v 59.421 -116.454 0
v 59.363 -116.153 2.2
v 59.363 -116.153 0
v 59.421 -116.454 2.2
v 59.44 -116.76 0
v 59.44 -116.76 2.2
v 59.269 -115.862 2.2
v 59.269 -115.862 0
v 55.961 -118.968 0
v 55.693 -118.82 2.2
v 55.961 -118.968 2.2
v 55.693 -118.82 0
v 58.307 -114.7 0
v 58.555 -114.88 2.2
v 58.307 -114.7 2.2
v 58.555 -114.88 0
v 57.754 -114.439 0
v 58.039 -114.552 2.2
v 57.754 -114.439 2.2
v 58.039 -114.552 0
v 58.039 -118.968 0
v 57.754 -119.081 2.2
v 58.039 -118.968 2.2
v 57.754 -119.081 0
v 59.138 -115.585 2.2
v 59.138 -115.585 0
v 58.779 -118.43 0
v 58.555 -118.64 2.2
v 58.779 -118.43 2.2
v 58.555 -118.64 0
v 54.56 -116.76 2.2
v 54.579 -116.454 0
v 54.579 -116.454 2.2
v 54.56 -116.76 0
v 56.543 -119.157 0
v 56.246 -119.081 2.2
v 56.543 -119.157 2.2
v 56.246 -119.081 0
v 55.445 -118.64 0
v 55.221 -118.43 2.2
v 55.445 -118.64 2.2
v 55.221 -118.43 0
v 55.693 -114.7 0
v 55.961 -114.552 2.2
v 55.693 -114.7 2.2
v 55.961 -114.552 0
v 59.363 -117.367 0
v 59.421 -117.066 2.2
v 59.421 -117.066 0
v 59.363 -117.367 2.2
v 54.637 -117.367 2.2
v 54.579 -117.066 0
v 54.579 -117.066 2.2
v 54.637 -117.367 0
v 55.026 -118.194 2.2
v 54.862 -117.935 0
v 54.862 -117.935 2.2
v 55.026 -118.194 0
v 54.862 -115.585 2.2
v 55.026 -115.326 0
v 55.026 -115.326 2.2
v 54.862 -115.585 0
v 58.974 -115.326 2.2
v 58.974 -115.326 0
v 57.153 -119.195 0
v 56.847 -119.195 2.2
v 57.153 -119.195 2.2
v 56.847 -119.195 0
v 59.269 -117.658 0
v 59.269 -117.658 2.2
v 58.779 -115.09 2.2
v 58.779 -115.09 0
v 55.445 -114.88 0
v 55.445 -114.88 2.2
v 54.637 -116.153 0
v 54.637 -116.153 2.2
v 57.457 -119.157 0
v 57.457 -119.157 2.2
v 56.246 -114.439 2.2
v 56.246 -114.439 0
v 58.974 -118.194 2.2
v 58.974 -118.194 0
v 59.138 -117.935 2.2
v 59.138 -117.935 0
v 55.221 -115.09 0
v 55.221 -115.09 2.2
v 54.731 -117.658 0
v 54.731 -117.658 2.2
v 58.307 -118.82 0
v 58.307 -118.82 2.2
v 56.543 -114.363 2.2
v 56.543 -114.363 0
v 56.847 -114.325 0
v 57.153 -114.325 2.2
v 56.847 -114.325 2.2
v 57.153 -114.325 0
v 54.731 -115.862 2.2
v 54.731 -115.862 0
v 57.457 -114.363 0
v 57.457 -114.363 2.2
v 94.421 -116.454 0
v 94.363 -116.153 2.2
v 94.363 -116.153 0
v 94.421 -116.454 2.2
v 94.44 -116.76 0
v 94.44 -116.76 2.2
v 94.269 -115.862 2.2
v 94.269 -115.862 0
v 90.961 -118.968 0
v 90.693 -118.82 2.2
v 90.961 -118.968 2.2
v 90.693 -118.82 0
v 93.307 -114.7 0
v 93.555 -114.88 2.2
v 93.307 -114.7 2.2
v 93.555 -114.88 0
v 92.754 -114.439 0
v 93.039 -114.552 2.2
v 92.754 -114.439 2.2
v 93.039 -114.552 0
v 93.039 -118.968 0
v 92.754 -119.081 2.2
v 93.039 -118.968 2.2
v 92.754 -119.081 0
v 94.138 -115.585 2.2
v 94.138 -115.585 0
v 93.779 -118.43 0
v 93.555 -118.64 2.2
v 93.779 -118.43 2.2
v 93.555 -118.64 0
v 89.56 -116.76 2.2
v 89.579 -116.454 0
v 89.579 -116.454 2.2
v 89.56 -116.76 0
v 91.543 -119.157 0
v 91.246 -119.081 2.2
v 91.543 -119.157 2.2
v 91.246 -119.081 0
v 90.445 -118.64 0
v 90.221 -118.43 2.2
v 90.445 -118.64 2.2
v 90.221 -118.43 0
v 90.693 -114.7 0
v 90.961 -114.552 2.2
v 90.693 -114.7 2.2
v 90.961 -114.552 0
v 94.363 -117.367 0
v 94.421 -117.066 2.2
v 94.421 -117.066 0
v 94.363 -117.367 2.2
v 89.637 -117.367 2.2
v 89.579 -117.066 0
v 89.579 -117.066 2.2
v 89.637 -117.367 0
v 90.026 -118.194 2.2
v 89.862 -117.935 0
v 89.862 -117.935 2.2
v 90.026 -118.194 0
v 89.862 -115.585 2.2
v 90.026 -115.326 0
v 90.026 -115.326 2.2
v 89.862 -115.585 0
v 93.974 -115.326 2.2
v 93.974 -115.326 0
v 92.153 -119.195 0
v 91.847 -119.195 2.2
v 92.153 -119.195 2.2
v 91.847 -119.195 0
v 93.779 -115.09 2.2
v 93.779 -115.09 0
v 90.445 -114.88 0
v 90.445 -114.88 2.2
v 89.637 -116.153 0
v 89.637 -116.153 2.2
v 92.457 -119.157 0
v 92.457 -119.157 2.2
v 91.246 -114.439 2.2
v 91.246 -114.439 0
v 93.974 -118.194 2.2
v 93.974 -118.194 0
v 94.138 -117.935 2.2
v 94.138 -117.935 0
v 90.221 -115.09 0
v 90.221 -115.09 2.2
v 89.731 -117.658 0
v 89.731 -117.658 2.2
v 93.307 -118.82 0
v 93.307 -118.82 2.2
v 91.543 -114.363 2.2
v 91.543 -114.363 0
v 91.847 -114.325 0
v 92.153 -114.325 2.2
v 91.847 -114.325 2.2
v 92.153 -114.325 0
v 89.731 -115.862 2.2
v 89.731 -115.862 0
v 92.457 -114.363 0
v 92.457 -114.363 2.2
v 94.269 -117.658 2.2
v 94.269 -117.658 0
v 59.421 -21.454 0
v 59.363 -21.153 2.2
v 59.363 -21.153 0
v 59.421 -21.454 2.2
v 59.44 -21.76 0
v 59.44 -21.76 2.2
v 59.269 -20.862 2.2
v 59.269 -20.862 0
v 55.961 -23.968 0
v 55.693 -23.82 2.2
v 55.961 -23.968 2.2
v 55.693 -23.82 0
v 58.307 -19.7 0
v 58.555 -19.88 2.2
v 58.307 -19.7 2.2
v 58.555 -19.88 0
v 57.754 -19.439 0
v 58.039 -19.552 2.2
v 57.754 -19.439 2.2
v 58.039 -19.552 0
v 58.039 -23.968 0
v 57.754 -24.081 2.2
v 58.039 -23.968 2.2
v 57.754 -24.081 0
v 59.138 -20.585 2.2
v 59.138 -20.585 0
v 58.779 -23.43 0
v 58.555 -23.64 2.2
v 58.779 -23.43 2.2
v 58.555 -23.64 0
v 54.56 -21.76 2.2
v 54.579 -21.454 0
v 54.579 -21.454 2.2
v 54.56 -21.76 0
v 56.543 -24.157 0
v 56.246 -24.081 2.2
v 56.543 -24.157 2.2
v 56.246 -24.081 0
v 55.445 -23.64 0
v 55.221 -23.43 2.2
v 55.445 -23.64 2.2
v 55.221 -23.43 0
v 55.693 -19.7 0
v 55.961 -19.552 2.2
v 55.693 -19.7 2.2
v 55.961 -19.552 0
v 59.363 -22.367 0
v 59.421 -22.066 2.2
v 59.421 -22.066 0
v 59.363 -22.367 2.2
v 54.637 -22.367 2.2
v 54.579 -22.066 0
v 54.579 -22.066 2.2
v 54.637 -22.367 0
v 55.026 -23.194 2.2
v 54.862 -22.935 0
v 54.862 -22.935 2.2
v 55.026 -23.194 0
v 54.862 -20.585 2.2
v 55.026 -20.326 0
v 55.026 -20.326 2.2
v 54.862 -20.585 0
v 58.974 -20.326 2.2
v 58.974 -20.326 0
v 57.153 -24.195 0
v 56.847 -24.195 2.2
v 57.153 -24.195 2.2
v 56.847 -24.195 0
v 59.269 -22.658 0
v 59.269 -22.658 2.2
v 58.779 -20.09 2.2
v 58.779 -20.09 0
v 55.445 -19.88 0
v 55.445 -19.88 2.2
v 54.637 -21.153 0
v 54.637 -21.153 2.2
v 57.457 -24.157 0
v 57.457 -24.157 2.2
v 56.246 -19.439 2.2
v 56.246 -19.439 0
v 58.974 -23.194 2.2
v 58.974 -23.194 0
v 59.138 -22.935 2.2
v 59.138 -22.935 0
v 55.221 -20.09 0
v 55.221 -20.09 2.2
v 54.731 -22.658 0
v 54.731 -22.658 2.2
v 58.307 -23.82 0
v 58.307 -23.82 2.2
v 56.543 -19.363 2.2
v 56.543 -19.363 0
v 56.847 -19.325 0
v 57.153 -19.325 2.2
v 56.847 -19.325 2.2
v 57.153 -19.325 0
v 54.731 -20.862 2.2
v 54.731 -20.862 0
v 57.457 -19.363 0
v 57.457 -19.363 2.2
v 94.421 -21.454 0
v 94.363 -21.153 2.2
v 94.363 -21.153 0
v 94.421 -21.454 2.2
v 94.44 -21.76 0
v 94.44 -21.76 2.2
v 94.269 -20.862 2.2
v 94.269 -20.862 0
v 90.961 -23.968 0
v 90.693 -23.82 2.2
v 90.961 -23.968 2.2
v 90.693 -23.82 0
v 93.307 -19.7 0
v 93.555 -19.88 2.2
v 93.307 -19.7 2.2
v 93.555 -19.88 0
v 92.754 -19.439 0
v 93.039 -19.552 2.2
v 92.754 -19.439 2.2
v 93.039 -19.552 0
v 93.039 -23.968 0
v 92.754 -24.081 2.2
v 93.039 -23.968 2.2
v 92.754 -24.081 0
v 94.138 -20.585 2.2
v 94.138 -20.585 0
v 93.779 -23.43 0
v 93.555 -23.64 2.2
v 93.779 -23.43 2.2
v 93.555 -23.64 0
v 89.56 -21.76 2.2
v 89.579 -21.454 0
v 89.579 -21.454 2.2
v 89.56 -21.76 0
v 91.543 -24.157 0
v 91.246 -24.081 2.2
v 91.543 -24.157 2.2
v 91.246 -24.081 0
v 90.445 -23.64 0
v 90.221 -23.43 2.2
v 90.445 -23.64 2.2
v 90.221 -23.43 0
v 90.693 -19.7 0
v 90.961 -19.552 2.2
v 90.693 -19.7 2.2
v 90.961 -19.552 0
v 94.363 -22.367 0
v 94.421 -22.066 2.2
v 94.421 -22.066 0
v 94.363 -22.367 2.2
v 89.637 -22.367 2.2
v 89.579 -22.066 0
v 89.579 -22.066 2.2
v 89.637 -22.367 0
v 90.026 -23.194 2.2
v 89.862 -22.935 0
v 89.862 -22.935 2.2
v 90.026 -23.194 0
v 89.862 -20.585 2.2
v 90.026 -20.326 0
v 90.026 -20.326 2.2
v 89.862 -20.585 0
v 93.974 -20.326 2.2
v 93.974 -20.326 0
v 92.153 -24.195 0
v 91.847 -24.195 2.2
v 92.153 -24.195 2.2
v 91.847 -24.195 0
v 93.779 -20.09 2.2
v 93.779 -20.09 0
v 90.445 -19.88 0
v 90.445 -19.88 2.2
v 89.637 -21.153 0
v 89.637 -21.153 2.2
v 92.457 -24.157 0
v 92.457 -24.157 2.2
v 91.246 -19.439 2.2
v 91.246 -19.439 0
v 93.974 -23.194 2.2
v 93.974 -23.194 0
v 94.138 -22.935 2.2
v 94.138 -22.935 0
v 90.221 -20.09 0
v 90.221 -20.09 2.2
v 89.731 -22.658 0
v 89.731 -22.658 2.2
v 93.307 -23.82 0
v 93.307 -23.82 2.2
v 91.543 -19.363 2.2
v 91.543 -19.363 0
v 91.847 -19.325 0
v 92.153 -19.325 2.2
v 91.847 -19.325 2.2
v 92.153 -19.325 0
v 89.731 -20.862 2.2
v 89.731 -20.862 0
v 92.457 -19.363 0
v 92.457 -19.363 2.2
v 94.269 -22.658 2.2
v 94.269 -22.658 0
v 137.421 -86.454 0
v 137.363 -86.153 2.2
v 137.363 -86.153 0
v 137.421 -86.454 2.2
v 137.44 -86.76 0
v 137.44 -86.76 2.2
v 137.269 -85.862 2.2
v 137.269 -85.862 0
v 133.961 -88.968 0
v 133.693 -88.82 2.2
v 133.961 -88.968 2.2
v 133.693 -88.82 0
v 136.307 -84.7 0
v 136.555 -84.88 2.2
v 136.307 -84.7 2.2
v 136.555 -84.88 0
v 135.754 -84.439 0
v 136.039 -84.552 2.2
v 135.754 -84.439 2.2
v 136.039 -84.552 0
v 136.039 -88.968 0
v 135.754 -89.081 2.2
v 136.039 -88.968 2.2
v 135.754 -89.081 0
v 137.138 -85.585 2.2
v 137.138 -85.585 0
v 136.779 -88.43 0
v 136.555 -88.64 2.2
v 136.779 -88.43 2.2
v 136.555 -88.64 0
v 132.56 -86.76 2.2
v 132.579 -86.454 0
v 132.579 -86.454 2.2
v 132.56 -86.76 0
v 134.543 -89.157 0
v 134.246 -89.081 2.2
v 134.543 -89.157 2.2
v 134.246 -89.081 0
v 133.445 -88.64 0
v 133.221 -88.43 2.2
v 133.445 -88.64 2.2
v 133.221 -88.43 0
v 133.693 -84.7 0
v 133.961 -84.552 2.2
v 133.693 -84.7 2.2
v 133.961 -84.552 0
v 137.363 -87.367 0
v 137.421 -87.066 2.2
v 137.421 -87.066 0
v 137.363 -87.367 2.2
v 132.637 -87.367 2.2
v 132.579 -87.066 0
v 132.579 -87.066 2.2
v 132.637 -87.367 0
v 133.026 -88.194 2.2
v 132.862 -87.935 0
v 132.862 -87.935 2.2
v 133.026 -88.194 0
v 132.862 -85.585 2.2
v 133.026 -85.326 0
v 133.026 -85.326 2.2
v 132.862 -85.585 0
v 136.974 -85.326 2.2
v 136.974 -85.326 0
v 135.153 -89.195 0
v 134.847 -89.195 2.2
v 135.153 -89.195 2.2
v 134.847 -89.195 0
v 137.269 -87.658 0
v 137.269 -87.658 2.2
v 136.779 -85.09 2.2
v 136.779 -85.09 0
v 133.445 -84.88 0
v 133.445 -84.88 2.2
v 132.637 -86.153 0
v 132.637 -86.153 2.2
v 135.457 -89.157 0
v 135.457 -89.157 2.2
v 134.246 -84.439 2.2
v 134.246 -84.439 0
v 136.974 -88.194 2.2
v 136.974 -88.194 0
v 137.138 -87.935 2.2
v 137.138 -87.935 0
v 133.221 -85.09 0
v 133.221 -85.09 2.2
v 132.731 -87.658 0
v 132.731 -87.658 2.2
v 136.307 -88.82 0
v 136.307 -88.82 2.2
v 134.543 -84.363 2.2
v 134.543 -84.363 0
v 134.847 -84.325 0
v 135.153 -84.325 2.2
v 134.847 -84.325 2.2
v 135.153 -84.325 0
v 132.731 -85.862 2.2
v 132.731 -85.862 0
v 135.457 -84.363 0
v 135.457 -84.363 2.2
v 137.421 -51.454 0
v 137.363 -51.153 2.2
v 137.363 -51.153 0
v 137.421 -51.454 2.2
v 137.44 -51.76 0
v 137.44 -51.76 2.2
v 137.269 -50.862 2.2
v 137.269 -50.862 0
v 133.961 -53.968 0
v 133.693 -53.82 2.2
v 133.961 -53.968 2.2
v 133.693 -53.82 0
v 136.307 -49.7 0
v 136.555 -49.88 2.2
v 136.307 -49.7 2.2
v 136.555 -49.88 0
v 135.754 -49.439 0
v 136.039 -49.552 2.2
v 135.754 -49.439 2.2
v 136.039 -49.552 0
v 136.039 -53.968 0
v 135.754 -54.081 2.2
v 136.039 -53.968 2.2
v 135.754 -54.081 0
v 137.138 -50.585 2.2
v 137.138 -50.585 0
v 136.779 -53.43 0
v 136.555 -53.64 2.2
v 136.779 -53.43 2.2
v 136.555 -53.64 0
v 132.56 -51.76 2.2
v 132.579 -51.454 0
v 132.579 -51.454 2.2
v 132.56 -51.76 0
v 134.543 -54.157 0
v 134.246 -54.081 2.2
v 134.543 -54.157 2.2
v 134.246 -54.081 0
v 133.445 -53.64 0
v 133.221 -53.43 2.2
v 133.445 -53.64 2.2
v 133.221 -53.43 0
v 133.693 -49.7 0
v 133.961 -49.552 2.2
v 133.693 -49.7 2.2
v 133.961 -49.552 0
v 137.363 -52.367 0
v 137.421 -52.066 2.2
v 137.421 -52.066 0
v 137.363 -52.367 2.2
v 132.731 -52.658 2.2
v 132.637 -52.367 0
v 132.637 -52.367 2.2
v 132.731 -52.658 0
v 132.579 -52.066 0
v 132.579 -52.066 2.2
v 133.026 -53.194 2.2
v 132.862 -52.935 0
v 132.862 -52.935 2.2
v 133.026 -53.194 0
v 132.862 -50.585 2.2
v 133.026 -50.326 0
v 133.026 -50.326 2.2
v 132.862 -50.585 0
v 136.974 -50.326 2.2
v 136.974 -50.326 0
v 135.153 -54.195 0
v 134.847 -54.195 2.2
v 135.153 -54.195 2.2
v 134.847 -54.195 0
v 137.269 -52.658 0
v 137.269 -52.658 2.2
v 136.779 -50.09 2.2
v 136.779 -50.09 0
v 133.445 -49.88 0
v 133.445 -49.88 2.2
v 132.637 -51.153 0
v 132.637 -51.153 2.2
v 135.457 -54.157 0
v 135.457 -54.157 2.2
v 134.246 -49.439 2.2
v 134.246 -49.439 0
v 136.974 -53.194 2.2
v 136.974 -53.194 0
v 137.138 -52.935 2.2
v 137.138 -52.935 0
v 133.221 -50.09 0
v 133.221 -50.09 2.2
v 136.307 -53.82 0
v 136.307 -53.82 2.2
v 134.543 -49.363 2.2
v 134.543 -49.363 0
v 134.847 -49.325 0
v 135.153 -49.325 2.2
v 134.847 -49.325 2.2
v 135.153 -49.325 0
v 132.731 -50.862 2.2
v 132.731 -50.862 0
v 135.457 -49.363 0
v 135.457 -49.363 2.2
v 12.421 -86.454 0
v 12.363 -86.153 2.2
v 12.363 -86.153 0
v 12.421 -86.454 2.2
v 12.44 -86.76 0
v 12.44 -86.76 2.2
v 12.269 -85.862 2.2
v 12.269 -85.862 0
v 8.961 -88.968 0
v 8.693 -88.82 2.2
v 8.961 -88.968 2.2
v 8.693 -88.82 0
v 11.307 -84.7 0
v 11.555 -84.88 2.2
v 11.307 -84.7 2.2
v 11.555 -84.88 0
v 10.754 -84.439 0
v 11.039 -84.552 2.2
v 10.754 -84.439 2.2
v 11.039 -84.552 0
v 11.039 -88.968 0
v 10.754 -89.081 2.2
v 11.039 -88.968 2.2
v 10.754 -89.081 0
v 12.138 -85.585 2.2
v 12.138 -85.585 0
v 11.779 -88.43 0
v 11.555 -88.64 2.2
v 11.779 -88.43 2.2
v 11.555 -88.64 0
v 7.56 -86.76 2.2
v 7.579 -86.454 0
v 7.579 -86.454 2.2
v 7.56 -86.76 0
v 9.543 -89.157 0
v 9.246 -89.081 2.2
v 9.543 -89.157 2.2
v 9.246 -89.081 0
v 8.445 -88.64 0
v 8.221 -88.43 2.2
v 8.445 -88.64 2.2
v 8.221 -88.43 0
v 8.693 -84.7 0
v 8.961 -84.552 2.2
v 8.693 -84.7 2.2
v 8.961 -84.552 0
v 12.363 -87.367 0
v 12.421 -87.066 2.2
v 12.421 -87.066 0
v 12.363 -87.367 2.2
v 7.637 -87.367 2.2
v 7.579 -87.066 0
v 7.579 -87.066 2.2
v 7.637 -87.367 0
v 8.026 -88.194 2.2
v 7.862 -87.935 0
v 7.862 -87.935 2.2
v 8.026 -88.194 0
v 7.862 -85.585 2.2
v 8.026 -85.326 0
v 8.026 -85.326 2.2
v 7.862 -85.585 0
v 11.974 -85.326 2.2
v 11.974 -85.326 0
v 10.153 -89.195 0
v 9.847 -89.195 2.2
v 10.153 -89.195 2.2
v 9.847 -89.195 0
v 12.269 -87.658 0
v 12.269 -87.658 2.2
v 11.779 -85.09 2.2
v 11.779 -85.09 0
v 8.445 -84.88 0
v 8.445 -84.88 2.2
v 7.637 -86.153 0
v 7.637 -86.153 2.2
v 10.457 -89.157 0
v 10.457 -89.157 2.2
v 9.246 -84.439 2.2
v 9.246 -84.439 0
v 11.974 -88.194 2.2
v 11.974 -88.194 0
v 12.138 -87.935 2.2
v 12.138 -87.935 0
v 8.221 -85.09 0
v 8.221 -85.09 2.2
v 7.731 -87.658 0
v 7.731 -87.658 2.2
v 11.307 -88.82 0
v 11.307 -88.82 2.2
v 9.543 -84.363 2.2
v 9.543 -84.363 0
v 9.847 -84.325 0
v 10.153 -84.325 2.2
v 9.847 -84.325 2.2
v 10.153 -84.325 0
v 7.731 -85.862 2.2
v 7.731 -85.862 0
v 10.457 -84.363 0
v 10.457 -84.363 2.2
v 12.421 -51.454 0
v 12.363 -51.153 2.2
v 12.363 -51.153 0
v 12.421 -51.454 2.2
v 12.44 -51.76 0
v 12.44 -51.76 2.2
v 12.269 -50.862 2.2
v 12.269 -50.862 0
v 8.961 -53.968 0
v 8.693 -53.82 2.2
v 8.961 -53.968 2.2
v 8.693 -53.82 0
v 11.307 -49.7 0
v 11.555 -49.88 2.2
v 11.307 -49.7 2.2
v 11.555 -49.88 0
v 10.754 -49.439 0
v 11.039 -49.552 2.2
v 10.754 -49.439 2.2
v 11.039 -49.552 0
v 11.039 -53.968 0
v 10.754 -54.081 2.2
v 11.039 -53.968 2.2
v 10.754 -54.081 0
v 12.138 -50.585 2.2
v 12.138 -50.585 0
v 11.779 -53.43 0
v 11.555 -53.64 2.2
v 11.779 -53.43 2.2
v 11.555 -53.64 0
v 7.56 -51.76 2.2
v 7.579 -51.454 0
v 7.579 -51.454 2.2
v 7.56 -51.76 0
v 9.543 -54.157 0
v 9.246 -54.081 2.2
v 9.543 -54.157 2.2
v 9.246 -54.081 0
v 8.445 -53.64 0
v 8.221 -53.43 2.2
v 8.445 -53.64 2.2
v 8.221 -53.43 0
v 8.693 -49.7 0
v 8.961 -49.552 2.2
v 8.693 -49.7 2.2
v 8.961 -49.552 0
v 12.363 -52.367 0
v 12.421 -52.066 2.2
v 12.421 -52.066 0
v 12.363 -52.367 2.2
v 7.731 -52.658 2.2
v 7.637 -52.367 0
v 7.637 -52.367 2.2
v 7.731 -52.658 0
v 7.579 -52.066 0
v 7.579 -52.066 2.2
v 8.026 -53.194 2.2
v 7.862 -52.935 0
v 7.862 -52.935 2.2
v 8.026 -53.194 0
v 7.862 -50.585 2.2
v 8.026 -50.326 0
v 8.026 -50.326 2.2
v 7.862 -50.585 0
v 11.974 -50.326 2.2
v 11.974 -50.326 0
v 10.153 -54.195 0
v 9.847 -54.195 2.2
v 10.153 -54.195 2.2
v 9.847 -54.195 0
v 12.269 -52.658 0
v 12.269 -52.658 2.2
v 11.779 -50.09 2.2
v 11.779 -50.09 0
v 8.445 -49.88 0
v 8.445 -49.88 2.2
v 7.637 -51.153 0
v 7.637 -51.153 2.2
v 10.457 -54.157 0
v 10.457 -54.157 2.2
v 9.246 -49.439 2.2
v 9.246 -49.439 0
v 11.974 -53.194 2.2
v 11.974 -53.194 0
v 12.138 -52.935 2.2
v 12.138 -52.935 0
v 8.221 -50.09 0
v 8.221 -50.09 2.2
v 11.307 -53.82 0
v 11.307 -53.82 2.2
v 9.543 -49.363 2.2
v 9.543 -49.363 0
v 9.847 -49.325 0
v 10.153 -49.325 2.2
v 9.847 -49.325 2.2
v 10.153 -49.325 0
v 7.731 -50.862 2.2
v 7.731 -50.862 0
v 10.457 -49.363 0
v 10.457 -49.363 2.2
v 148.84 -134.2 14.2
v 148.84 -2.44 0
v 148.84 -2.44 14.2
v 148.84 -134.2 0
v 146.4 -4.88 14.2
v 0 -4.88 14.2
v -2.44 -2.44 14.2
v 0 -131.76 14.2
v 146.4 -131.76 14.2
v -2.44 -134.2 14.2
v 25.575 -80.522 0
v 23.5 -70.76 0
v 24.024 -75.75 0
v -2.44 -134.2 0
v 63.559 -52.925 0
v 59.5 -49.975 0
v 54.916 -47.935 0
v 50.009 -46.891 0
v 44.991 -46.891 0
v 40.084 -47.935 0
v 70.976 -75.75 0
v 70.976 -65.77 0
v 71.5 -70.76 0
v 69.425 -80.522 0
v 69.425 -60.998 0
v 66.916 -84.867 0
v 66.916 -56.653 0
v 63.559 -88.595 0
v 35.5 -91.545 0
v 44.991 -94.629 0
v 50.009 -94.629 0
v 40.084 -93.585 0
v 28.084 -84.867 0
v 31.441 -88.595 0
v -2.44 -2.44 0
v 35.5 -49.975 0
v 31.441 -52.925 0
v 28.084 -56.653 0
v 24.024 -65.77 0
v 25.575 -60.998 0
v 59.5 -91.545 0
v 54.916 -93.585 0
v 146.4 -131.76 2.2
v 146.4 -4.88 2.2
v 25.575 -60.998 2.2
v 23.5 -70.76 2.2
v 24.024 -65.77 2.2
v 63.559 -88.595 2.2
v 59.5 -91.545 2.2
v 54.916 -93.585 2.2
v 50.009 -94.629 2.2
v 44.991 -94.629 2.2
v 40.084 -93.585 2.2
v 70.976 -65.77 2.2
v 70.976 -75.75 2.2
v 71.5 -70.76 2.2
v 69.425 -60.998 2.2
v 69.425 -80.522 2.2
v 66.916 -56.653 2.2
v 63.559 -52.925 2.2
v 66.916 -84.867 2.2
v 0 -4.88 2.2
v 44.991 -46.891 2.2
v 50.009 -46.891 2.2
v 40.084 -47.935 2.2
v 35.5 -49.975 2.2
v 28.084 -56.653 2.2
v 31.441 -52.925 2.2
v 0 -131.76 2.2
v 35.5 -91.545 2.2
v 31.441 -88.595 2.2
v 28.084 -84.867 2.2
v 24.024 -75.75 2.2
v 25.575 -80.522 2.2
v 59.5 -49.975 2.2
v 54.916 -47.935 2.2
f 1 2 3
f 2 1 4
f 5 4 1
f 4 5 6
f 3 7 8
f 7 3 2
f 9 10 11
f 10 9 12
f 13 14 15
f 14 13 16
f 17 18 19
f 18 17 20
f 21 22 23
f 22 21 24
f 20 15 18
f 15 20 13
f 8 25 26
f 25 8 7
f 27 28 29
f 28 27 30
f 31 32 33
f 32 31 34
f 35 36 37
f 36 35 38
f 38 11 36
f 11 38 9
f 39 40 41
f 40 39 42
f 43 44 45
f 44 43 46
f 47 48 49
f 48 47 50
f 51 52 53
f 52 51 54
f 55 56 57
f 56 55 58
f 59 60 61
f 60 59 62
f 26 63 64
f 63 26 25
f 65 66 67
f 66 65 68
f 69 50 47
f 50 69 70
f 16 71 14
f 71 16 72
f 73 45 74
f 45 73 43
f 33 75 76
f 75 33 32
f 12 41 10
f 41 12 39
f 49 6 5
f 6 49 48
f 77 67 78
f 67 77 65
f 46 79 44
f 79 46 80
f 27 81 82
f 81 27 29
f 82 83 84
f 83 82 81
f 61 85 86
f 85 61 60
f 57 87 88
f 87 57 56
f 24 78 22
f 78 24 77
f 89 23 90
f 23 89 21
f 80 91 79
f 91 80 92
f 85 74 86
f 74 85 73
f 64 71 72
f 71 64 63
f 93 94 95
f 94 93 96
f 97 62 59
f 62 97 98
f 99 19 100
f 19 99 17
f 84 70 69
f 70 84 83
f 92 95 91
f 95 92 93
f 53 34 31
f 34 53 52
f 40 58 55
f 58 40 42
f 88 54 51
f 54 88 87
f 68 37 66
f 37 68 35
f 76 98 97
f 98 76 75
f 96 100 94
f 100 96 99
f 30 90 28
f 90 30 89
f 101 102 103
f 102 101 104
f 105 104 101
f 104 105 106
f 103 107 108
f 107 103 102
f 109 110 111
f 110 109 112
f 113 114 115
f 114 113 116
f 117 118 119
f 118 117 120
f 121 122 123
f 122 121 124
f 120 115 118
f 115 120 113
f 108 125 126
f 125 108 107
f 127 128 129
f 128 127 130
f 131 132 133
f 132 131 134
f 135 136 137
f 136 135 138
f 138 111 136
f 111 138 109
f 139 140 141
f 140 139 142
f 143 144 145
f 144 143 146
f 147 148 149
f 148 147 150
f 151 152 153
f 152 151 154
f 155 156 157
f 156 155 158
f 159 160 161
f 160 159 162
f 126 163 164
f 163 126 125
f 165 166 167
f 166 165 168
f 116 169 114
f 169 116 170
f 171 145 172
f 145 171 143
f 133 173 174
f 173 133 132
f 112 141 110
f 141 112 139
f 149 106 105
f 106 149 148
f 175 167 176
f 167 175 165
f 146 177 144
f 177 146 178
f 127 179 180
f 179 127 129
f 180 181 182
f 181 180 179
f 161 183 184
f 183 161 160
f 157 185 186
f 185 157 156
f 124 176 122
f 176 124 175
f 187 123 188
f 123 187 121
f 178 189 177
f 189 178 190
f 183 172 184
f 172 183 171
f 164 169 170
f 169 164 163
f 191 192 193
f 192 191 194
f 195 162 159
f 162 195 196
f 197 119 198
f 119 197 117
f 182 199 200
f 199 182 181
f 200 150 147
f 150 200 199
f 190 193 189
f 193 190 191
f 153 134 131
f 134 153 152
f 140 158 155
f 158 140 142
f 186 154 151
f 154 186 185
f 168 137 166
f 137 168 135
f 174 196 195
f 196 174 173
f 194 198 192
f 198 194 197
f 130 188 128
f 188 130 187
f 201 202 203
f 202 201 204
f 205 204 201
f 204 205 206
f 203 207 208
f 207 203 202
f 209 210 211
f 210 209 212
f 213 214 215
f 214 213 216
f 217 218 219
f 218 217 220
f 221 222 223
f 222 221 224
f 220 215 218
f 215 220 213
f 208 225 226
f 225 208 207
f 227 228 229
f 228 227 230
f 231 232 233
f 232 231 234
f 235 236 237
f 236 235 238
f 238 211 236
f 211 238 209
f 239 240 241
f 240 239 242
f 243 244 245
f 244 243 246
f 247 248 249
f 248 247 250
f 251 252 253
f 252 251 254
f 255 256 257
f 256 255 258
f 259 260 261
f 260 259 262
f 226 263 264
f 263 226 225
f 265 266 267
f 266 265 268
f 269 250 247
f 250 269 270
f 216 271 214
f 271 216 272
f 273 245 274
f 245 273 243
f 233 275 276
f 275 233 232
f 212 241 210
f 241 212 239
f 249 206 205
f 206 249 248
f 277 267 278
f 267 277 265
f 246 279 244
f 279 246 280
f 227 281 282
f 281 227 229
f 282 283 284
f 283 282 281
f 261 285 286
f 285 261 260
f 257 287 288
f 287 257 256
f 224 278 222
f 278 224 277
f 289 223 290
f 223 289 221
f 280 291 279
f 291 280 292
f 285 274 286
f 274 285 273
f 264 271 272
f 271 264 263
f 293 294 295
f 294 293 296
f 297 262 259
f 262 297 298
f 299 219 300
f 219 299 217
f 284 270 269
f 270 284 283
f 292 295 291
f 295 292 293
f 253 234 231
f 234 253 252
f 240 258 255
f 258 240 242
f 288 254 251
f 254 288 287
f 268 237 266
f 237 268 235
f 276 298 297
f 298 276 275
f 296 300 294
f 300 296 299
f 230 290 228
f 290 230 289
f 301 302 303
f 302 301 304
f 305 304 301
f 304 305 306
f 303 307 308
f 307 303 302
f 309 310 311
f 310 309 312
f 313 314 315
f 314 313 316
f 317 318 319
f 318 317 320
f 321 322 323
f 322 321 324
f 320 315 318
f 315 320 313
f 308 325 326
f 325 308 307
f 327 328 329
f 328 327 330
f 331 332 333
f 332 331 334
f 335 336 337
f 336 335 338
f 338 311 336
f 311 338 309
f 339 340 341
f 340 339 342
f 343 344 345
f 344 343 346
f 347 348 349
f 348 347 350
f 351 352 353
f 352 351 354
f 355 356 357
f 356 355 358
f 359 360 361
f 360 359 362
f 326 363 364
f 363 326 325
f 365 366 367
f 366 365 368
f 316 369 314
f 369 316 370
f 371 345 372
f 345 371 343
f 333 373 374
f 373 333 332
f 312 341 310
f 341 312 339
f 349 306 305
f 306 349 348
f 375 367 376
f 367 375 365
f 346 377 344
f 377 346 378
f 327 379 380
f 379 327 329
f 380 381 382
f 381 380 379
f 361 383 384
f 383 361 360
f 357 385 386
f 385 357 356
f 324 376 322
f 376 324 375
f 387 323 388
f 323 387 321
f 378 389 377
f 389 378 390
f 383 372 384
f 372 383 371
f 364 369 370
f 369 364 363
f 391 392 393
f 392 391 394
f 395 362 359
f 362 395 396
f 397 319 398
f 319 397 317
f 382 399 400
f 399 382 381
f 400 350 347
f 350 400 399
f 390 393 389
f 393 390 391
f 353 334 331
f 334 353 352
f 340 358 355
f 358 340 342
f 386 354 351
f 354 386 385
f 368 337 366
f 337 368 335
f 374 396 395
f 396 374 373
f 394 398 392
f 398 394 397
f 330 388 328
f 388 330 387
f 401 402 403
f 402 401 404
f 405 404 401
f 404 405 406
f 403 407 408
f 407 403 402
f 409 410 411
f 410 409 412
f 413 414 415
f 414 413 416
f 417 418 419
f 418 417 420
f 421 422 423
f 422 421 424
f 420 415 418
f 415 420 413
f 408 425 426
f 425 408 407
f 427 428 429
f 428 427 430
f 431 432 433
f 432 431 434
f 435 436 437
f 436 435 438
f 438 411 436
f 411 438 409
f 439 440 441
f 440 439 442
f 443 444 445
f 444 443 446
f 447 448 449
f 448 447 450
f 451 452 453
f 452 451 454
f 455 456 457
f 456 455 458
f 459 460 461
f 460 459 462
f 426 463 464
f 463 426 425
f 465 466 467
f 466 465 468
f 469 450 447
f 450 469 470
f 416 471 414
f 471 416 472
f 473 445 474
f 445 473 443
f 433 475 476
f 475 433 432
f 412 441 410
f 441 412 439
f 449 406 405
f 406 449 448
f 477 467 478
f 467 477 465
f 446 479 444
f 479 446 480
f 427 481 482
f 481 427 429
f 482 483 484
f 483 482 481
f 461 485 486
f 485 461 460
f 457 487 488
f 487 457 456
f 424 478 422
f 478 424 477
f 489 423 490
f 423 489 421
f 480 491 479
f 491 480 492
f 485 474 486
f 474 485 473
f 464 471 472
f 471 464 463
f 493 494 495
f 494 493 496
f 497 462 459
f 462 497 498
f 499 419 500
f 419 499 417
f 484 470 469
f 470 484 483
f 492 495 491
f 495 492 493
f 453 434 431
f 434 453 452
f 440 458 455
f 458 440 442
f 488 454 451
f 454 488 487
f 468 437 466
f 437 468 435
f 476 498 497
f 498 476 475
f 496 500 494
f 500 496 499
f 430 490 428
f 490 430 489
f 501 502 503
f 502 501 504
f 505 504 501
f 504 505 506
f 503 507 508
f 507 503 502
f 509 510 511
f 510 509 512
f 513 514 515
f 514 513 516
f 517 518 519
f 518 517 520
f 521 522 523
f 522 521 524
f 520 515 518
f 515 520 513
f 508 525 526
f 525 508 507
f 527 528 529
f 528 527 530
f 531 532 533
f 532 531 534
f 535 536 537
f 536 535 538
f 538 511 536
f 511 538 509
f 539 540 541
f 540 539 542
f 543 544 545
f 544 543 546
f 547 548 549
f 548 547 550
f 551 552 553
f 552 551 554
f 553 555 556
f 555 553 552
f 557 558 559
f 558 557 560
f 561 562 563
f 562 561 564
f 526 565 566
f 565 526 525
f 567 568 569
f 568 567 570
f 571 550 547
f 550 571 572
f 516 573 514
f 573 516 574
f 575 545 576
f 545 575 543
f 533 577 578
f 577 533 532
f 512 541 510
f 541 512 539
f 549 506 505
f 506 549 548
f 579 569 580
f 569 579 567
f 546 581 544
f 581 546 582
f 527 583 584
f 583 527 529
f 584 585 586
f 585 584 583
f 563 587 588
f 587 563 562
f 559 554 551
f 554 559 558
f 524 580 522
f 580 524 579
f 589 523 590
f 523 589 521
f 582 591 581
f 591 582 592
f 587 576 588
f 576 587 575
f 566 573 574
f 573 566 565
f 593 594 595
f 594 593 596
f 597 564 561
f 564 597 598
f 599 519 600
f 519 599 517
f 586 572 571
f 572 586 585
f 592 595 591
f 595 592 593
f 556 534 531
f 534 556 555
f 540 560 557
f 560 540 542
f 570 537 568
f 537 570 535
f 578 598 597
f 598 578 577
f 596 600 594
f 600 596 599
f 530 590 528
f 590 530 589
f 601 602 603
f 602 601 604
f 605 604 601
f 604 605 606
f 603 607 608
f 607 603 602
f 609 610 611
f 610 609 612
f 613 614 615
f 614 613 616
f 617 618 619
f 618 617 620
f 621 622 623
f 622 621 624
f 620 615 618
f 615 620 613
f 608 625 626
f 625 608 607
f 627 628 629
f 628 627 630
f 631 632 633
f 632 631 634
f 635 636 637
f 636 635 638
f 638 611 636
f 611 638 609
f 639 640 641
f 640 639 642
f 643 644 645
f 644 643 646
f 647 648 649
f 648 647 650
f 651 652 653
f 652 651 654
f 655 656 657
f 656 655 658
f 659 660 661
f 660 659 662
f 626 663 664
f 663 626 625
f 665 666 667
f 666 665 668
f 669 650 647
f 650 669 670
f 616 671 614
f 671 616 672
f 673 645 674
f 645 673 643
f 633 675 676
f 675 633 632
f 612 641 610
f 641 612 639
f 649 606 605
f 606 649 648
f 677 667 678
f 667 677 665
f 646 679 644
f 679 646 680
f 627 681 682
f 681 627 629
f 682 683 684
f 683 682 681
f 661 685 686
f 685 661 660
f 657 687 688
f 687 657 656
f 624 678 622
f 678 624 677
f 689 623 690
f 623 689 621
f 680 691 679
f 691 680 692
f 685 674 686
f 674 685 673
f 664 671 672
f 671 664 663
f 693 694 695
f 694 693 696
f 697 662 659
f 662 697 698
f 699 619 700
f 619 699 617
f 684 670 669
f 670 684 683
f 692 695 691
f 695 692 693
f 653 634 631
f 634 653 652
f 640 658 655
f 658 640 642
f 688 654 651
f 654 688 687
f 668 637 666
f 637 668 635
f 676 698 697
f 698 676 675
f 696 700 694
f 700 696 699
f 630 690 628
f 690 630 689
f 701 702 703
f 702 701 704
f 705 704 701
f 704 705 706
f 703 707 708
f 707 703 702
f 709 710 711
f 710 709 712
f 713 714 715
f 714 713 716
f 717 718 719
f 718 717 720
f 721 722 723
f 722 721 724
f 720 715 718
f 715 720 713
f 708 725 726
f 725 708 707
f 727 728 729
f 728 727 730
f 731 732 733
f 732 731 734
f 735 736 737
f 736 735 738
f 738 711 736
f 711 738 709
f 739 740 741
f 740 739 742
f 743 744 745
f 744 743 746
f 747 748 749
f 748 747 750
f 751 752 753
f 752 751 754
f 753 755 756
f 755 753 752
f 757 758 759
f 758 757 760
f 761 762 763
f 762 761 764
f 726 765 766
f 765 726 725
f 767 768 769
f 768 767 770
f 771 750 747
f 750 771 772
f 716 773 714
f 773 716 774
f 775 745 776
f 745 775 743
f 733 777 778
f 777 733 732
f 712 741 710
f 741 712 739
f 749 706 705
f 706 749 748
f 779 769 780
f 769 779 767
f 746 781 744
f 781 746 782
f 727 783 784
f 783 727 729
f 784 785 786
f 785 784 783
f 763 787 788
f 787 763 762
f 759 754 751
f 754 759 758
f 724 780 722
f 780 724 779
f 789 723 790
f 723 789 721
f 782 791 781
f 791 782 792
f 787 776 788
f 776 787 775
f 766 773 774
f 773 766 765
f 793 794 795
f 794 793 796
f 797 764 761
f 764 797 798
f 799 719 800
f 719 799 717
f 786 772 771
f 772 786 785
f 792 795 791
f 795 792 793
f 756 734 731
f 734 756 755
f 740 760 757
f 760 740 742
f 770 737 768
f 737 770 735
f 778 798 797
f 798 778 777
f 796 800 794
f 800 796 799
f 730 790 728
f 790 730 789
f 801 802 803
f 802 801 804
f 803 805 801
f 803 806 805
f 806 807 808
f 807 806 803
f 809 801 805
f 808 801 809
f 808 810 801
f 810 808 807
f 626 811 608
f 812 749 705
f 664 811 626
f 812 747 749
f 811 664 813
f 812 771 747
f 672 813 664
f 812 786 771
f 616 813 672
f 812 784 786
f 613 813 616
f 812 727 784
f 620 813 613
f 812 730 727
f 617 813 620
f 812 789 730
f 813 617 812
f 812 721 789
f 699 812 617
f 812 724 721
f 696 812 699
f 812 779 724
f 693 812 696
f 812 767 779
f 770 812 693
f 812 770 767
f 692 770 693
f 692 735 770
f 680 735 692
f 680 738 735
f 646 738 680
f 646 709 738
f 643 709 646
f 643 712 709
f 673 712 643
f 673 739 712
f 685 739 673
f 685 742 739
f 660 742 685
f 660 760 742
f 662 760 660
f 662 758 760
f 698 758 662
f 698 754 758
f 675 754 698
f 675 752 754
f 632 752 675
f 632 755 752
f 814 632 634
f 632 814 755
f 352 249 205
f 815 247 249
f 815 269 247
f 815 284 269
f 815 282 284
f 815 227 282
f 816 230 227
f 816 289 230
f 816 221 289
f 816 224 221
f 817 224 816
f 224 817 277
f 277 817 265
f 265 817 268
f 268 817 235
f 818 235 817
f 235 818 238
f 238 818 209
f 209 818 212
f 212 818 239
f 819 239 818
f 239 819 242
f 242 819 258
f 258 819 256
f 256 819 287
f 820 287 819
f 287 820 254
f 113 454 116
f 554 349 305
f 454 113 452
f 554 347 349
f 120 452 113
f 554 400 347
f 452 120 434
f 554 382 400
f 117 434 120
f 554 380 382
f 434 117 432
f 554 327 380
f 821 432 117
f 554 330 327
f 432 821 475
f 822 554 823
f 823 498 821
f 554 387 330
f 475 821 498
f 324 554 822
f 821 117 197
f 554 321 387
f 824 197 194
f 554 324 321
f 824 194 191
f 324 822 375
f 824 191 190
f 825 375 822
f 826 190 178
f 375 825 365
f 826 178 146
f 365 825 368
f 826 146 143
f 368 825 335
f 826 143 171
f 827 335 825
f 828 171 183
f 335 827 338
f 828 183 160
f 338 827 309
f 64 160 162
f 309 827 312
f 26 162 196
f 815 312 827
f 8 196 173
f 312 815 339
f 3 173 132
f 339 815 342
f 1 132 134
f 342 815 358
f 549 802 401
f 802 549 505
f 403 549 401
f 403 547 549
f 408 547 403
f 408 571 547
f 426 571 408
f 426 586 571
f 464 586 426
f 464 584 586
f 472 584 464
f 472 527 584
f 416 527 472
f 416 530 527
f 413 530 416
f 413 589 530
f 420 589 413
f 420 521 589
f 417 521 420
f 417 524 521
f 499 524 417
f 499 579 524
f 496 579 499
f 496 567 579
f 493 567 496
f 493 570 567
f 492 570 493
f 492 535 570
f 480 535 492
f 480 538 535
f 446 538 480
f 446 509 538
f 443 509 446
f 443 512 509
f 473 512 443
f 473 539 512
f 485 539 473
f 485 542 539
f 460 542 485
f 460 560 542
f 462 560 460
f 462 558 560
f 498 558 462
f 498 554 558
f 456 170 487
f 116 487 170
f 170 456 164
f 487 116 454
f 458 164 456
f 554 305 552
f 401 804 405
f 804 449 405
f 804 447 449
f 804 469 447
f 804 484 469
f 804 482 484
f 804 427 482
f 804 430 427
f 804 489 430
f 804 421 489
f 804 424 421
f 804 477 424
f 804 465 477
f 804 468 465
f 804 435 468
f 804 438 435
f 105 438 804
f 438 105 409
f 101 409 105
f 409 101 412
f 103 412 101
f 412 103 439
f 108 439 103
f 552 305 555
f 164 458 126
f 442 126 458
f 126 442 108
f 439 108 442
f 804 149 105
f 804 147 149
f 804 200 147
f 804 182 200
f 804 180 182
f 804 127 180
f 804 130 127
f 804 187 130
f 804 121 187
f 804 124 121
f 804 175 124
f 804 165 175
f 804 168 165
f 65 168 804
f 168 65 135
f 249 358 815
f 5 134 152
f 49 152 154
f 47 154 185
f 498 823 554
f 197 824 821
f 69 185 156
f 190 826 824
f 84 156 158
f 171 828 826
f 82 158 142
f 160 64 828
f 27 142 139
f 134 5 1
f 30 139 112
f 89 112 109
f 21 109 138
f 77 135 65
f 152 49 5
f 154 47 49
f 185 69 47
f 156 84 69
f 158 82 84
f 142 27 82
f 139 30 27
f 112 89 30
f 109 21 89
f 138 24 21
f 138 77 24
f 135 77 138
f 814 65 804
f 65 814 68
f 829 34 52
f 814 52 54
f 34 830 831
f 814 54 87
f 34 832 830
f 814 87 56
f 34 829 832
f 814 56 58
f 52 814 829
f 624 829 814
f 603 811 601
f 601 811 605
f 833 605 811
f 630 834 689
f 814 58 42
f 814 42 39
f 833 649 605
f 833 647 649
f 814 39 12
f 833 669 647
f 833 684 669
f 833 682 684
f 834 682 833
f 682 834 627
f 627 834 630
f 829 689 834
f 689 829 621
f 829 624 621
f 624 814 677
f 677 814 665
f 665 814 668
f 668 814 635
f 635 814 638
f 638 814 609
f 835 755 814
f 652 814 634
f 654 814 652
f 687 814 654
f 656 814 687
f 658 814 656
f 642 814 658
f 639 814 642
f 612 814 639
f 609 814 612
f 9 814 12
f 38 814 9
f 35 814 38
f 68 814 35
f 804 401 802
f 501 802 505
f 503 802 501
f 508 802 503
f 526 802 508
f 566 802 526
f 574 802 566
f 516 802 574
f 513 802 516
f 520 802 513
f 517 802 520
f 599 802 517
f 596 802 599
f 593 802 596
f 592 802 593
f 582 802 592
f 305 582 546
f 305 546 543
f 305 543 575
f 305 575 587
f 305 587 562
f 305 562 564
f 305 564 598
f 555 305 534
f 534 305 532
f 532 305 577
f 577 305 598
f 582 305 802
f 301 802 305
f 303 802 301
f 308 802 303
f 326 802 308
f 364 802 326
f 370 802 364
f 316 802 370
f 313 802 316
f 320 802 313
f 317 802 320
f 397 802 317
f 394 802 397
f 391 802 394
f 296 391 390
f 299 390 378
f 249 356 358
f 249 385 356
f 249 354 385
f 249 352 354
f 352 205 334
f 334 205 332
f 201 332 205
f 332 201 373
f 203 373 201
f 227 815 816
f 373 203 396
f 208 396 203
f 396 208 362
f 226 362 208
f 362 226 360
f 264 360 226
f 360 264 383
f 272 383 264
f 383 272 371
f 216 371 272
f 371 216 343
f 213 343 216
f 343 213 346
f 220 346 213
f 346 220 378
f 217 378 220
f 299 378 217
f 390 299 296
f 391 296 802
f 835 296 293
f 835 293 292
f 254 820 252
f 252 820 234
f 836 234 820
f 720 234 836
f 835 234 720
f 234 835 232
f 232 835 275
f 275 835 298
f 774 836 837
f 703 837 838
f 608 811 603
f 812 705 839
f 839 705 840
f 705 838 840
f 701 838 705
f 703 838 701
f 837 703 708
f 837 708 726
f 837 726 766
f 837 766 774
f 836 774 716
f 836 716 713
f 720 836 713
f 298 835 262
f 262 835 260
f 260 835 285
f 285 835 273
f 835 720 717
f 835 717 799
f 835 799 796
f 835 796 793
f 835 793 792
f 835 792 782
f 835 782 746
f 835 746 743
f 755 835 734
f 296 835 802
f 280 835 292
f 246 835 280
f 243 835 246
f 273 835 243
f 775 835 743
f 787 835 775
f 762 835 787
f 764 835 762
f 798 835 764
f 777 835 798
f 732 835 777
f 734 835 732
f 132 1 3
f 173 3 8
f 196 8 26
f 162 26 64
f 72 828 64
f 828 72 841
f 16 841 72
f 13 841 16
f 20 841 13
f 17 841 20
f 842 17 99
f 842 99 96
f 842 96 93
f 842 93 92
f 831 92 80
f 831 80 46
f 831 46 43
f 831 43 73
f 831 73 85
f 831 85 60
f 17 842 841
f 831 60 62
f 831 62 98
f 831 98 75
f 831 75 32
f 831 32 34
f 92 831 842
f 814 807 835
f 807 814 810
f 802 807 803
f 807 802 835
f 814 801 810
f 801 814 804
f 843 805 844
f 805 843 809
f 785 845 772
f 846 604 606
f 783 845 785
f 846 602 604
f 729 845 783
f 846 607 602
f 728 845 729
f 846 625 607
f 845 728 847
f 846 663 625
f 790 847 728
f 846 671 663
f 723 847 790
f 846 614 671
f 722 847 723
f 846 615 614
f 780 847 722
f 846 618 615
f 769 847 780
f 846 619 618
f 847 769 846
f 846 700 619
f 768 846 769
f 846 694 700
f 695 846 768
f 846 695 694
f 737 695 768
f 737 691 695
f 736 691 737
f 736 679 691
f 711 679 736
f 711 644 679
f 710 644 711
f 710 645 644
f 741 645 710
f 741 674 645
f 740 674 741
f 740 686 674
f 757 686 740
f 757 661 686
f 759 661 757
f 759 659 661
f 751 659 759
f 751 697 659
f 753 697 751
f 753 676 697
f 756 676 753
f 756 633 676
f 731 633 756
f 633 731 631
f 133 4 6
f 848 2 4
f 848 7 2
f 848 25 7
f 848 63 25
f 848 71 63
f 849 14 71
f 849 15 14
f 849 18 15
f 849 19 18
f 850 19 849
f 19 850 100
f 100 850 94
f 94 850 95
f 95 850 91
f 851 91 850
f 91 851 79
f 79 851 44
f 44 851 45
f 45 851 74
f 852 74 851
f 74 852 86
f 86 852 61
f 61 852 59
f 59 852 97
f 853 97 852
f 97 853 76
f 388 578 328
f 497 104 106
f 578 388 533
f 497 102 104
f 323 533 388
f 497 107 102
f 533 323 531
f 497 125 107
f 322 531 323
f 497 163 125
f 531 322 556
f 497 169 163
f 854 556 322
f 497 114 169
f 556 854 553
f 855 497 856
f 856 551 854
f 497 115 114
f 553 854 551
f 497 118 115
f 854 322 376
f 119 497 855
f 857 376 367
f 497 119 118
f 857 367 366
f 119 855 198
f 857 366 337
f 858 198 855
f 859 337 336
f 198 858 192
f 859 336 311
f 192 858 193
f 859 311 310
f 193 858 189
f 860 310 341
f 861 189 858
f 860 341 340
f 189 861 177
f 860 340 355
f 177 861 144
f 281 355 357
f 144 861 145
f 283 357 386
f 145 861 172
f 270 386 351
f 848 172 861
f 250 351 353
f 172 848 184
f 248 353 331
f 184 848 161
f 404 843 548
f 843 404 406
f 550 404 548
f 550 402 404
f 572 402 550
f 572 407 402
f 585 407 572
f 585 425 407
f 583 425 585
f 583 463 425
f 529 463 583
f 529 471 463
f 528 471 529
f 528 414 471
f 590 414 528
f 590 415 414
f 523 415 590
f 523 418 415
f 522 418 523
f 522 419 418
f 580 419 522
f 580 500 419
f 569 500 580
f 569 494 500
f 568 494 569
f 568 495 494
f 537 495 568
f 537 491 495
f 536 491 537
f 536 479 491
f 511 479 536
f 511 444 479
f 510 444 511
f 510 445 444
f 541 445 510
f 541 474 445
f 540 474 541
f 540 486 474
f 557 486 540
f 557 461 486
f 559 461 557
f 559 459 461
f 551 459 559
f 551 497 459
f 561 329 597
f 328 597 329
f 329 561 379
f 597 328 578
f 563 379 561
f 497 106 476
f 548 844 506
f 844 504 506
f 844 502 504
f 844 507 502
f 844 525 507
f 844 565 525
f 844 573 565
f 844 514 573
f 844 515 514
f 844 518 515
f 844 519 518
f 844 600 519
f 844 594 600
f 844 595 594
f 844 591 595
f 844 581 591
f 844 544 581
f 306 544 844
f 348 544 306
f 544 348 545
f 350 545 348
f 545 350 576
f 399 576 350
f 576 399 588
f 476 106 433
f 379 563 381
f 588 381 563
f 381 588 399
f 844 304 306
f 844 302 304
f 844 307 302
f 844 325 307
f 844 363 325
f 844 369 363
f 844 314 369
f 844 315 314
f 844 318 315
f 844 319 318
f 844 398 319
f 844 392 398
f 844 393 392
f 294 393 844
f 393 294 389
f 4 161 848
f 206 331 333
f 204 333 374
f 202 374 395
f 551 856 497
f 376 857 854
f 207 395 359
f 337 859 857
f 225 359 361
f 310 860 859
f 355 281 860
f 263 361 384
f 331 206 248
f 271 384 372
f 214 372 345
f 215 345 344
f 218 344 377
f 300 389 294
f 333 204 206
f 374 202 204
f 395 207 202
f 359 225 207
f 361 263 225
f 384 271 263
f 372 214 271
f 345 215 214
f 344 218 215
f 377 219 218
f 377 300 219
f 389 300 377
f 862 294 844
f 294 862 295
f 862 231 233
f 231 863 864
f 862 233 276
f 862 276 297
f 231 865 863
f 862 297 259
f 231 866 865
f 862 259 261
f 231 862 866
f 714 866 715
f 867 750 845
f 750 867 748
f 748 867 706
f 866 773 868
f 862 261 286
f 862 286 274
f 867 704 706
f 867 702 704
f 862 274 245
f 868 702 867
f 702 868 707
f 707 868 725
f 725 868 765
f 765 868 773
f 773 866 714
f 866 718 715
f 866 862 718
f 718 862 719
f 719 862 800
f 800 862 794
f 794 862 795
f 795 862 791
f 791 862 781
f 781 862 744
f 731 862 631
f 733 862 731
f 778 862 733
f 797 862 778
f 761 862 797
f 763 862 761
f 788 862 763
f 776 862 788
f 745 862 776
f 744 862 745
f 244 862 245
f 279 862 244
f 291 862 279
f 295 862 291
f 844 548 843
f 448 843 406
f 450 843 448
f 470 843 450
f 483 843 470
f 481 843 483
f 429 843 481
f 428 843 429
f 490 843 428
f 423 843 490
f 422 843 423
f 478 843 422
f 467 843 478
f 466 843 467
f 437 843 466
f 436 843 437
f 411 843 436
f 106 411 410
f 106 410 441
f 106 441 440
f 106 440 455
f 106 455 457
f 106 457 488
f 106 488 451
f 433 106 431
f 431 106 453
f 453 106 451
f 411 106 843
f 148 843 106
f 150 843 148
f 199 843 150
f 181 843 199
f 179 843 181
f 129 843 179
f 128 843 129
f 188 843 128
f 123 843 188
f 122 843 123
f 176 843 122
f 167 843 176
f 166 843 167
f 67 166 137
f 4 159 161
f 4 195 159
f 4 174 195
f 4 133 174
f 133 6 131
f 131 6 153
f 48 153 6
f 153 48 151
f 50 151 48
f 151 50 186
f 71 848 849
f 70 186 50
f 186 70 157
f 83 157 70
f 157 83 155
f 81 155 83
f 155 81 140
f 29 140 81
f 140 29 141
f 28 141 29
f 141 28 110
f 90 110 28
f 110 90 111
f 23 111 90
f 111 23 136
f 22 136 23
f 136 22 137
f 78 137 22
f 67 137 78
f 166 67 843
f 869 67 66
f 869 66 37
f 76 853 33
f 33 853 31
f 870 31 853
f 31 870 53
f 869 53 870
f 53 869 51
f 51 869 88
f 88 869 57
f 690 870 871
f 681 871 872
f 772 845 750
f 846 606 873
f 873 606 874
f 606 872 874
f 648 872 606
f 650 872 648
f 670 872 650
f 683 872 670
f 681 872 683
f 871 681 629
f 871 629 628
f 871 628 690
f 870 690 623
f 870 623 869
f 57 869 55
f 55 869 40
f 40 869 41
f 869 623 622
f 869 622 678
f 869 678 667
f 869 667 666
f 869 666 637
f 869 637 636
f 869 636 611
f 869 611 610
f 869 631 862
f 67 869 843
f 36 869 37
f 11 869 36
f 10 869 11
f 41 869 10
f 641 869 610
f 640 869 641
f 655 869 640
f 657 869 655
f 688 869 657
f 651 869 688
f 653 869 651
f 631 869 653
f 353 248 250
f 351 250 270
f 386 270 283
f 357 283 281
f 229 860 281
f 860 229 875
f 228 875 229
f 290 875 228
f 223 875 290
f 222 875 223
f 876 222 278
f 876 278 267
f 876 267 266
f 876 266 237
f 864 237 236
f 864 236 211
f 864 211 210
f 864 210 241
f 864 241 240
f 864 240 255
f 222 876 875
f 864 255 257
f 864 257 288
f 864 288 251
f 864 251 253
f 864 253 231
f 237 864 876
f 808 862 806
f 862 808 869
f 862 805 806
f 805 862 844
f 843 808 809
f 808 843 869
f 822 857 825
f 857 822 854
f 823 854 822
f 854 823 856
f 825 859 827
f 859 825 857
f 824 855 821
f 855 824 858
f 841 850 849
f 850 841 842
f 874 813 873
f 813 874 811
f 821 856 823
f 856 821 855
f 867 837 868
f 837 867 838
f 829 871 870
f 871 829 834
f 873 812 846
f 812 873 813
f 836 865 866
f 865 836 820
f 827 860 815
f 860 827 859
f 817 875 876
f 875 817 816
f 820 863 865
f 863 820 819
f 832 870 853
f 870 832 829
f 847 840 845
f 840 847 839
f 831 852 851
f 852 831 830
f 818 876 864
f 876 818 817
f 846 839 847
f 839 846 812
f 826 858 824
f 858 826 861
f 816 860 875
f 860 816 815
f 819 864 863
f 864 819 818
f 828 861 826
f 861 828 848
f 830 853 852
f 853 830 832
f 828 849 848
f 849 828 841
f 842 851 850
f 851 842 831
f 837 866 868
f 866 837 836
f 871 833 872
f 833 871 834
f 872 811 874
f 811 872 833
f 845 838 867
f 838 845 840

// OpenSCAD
first_layer_height = 0.4;
layer_height = 0.6;

bottom_width = first_layer_height + 3*layer_height;
top_width = 2*layer_height;
// lines: width (mm)
// 2: 1.67
// 3: 2.44
// 4: 3.21
// 5: 3.98
// 6: 4.76
wall_width = 2.44;

function xy_dim_adj(x) = ceil(x/wall_width)*wall_width;
function  z_dim_adj(z) = ceil(z/layer_height)*layer_height;

box_l = 140;
box_w = 120;
box_h = 36;
box_bt_h = 6;
cap_h = 12;

box_l_adj = xy_dim_adj(box_l);
box_w_adj = xy_dim_adj(box_w);
box_h_adj = z_dim_adj(box_h);
box_bt_h_adj = z_dim_adj(box_bt_h);
cap_h_adj = z_dim_adj(cap_h);

screws_hd = 5.55;
screws_hh = 2.38;
screws_hd_offset = first_layer_height+1*layer_height;
screws_d = 3;
screws_wall_offset_cnt = 10;
screws_xy = [
  [                screws_wall_offset_cnt*wall_width,               screws_wall_offset_cnt*wall_width],
  [box_l_adj - (screws_wall_offset_cnt/2)*wall_width,               screws_wall_offset_cnt*wall_width],
  [                screws_wall_offset_cnt*wall_width, box_w_adj-(screws_wall_offset_cnt/2)*wall_width],
  [box_l_adj - (screws_wall_offset_cnt/2)*wall_width, box_w_adj-(screws_wall_offset_cnt/2)*wall_width]
];

screws_hd_adj = xy_dim_adj(screws_hd);
screws_d_adj = xy_dim_adj(screws_d);

*difference() {
  cube([box_l_adj+2*wall_width, box_w_adj+2*wall_width, box_h_adj+bottom_width]);
  union() {
    translate([wall_width, wall_width, bottom_width])
      cube([box_l_adj, box_w_adj, box_h_adj+bottom_width]);
    
    translate([xy_dim_adj(12)+wall_width, -wall_width, bottom_width+box_bt_h_adj])
      cube([xy_dim_adj(118), 3*wall_width, box_h_adj+bottom_width]);
      
    translate([xy_dim_adj(22)+wall_width, box_w_adj, bottom_width+box_bt_h_adj])
      cube([xy_dim_adj(14), 3*wall_width, z_dim_adj(2+2)]);
    translate([xy_dim_adj(80)+wall_width, box_w_adj, bottom_width+box_bt_h_adj])
      cube([xy_dim_adj(10), 3*wall_width, z_dim_adj(3+2)]);
    translate([xy_dim_adj(98)+wall_width, box_w_adj, bottom_width+box_bt_h_adj])
      cube([xy_dim_adj(18), 3*wall_width, z_dim_adj(5+2)]);
    
    for(xy = screws_xy) {
      translate([xy[0], xy[1], screws_hd_offset])
        cylinder(h=bottom_width, d=screws_hd_adj, $fn=50, center=false);
      translate([xy[0], xy[1], 0])
        cylinder(h=3*bottom_width, d=screws_d_adj, $fn=50, center=true);
    }
  }
}

// CAM screws
cam_screws_hh = 2.38;
cam_screws_d = 3;
cam_screws_xy = [
  [ 25, 13],
  [ 60, 13],
];

// cap
cap_fan_d = 48;
cap_fan_x_offset = 47.5;
cap_fan_y_offset = 61;
translate([0, -box_w_adj-4*wall_width, 0])
difference() {
  translate([-wall_width, -wall_width, 0])
    cube([box_l_adj+4*wall_width, box_w_adj+4*wall_width, cap_h_adj+bottom_width]);
  translate([0, 0, bottom_width])
    cube([box_l_adj+2*wall_width, box_w_adj+2*wall_width, cap_h_adj+2*bottom_width]);
  translate([cap_fan_x_offset, cap_fan_y_offset, -bottom_width])
    cylinder(d=cap_fan_d, h=box_h_adj+2*bottom_width);
    
  // CAM screws
  translate([32, 5, 0]) {
    for(xy = cam_screws_xy) {
        translate([xy[0], xy[1]-3, 0])
          cylinder(h=4*bottom_width, d=screws_d_adj, $fn=50, center=true);
    }
  }
  translate([32, 100, 0]) {
    for(xy = cam_screws_xy) {
        translate([xy[0], xy[1]-3, 0])
          cylinder(h=4*bottom_width, d=screws_d_adj, $fn=50, center=true);
    }
  }
  // DOF screws
  translate([125, 20, 0]) {
    for(xy = cam_screws_xy) {
        translate([xy[1]-3, xy[0], 0])
          cylinder(h=4*bottom_width, d=screws_d_adj, $fn=50, center=true);
    }
  }
  translate([0, 20, 0]) {
    for(xy = cam_screws_xy) {
        translate([xy[1]-3, xy[0], 0])
          cylinder(h=4*bottom_width, d=screws_d_adj, $fn=50, center=true);
    }
  }
}
